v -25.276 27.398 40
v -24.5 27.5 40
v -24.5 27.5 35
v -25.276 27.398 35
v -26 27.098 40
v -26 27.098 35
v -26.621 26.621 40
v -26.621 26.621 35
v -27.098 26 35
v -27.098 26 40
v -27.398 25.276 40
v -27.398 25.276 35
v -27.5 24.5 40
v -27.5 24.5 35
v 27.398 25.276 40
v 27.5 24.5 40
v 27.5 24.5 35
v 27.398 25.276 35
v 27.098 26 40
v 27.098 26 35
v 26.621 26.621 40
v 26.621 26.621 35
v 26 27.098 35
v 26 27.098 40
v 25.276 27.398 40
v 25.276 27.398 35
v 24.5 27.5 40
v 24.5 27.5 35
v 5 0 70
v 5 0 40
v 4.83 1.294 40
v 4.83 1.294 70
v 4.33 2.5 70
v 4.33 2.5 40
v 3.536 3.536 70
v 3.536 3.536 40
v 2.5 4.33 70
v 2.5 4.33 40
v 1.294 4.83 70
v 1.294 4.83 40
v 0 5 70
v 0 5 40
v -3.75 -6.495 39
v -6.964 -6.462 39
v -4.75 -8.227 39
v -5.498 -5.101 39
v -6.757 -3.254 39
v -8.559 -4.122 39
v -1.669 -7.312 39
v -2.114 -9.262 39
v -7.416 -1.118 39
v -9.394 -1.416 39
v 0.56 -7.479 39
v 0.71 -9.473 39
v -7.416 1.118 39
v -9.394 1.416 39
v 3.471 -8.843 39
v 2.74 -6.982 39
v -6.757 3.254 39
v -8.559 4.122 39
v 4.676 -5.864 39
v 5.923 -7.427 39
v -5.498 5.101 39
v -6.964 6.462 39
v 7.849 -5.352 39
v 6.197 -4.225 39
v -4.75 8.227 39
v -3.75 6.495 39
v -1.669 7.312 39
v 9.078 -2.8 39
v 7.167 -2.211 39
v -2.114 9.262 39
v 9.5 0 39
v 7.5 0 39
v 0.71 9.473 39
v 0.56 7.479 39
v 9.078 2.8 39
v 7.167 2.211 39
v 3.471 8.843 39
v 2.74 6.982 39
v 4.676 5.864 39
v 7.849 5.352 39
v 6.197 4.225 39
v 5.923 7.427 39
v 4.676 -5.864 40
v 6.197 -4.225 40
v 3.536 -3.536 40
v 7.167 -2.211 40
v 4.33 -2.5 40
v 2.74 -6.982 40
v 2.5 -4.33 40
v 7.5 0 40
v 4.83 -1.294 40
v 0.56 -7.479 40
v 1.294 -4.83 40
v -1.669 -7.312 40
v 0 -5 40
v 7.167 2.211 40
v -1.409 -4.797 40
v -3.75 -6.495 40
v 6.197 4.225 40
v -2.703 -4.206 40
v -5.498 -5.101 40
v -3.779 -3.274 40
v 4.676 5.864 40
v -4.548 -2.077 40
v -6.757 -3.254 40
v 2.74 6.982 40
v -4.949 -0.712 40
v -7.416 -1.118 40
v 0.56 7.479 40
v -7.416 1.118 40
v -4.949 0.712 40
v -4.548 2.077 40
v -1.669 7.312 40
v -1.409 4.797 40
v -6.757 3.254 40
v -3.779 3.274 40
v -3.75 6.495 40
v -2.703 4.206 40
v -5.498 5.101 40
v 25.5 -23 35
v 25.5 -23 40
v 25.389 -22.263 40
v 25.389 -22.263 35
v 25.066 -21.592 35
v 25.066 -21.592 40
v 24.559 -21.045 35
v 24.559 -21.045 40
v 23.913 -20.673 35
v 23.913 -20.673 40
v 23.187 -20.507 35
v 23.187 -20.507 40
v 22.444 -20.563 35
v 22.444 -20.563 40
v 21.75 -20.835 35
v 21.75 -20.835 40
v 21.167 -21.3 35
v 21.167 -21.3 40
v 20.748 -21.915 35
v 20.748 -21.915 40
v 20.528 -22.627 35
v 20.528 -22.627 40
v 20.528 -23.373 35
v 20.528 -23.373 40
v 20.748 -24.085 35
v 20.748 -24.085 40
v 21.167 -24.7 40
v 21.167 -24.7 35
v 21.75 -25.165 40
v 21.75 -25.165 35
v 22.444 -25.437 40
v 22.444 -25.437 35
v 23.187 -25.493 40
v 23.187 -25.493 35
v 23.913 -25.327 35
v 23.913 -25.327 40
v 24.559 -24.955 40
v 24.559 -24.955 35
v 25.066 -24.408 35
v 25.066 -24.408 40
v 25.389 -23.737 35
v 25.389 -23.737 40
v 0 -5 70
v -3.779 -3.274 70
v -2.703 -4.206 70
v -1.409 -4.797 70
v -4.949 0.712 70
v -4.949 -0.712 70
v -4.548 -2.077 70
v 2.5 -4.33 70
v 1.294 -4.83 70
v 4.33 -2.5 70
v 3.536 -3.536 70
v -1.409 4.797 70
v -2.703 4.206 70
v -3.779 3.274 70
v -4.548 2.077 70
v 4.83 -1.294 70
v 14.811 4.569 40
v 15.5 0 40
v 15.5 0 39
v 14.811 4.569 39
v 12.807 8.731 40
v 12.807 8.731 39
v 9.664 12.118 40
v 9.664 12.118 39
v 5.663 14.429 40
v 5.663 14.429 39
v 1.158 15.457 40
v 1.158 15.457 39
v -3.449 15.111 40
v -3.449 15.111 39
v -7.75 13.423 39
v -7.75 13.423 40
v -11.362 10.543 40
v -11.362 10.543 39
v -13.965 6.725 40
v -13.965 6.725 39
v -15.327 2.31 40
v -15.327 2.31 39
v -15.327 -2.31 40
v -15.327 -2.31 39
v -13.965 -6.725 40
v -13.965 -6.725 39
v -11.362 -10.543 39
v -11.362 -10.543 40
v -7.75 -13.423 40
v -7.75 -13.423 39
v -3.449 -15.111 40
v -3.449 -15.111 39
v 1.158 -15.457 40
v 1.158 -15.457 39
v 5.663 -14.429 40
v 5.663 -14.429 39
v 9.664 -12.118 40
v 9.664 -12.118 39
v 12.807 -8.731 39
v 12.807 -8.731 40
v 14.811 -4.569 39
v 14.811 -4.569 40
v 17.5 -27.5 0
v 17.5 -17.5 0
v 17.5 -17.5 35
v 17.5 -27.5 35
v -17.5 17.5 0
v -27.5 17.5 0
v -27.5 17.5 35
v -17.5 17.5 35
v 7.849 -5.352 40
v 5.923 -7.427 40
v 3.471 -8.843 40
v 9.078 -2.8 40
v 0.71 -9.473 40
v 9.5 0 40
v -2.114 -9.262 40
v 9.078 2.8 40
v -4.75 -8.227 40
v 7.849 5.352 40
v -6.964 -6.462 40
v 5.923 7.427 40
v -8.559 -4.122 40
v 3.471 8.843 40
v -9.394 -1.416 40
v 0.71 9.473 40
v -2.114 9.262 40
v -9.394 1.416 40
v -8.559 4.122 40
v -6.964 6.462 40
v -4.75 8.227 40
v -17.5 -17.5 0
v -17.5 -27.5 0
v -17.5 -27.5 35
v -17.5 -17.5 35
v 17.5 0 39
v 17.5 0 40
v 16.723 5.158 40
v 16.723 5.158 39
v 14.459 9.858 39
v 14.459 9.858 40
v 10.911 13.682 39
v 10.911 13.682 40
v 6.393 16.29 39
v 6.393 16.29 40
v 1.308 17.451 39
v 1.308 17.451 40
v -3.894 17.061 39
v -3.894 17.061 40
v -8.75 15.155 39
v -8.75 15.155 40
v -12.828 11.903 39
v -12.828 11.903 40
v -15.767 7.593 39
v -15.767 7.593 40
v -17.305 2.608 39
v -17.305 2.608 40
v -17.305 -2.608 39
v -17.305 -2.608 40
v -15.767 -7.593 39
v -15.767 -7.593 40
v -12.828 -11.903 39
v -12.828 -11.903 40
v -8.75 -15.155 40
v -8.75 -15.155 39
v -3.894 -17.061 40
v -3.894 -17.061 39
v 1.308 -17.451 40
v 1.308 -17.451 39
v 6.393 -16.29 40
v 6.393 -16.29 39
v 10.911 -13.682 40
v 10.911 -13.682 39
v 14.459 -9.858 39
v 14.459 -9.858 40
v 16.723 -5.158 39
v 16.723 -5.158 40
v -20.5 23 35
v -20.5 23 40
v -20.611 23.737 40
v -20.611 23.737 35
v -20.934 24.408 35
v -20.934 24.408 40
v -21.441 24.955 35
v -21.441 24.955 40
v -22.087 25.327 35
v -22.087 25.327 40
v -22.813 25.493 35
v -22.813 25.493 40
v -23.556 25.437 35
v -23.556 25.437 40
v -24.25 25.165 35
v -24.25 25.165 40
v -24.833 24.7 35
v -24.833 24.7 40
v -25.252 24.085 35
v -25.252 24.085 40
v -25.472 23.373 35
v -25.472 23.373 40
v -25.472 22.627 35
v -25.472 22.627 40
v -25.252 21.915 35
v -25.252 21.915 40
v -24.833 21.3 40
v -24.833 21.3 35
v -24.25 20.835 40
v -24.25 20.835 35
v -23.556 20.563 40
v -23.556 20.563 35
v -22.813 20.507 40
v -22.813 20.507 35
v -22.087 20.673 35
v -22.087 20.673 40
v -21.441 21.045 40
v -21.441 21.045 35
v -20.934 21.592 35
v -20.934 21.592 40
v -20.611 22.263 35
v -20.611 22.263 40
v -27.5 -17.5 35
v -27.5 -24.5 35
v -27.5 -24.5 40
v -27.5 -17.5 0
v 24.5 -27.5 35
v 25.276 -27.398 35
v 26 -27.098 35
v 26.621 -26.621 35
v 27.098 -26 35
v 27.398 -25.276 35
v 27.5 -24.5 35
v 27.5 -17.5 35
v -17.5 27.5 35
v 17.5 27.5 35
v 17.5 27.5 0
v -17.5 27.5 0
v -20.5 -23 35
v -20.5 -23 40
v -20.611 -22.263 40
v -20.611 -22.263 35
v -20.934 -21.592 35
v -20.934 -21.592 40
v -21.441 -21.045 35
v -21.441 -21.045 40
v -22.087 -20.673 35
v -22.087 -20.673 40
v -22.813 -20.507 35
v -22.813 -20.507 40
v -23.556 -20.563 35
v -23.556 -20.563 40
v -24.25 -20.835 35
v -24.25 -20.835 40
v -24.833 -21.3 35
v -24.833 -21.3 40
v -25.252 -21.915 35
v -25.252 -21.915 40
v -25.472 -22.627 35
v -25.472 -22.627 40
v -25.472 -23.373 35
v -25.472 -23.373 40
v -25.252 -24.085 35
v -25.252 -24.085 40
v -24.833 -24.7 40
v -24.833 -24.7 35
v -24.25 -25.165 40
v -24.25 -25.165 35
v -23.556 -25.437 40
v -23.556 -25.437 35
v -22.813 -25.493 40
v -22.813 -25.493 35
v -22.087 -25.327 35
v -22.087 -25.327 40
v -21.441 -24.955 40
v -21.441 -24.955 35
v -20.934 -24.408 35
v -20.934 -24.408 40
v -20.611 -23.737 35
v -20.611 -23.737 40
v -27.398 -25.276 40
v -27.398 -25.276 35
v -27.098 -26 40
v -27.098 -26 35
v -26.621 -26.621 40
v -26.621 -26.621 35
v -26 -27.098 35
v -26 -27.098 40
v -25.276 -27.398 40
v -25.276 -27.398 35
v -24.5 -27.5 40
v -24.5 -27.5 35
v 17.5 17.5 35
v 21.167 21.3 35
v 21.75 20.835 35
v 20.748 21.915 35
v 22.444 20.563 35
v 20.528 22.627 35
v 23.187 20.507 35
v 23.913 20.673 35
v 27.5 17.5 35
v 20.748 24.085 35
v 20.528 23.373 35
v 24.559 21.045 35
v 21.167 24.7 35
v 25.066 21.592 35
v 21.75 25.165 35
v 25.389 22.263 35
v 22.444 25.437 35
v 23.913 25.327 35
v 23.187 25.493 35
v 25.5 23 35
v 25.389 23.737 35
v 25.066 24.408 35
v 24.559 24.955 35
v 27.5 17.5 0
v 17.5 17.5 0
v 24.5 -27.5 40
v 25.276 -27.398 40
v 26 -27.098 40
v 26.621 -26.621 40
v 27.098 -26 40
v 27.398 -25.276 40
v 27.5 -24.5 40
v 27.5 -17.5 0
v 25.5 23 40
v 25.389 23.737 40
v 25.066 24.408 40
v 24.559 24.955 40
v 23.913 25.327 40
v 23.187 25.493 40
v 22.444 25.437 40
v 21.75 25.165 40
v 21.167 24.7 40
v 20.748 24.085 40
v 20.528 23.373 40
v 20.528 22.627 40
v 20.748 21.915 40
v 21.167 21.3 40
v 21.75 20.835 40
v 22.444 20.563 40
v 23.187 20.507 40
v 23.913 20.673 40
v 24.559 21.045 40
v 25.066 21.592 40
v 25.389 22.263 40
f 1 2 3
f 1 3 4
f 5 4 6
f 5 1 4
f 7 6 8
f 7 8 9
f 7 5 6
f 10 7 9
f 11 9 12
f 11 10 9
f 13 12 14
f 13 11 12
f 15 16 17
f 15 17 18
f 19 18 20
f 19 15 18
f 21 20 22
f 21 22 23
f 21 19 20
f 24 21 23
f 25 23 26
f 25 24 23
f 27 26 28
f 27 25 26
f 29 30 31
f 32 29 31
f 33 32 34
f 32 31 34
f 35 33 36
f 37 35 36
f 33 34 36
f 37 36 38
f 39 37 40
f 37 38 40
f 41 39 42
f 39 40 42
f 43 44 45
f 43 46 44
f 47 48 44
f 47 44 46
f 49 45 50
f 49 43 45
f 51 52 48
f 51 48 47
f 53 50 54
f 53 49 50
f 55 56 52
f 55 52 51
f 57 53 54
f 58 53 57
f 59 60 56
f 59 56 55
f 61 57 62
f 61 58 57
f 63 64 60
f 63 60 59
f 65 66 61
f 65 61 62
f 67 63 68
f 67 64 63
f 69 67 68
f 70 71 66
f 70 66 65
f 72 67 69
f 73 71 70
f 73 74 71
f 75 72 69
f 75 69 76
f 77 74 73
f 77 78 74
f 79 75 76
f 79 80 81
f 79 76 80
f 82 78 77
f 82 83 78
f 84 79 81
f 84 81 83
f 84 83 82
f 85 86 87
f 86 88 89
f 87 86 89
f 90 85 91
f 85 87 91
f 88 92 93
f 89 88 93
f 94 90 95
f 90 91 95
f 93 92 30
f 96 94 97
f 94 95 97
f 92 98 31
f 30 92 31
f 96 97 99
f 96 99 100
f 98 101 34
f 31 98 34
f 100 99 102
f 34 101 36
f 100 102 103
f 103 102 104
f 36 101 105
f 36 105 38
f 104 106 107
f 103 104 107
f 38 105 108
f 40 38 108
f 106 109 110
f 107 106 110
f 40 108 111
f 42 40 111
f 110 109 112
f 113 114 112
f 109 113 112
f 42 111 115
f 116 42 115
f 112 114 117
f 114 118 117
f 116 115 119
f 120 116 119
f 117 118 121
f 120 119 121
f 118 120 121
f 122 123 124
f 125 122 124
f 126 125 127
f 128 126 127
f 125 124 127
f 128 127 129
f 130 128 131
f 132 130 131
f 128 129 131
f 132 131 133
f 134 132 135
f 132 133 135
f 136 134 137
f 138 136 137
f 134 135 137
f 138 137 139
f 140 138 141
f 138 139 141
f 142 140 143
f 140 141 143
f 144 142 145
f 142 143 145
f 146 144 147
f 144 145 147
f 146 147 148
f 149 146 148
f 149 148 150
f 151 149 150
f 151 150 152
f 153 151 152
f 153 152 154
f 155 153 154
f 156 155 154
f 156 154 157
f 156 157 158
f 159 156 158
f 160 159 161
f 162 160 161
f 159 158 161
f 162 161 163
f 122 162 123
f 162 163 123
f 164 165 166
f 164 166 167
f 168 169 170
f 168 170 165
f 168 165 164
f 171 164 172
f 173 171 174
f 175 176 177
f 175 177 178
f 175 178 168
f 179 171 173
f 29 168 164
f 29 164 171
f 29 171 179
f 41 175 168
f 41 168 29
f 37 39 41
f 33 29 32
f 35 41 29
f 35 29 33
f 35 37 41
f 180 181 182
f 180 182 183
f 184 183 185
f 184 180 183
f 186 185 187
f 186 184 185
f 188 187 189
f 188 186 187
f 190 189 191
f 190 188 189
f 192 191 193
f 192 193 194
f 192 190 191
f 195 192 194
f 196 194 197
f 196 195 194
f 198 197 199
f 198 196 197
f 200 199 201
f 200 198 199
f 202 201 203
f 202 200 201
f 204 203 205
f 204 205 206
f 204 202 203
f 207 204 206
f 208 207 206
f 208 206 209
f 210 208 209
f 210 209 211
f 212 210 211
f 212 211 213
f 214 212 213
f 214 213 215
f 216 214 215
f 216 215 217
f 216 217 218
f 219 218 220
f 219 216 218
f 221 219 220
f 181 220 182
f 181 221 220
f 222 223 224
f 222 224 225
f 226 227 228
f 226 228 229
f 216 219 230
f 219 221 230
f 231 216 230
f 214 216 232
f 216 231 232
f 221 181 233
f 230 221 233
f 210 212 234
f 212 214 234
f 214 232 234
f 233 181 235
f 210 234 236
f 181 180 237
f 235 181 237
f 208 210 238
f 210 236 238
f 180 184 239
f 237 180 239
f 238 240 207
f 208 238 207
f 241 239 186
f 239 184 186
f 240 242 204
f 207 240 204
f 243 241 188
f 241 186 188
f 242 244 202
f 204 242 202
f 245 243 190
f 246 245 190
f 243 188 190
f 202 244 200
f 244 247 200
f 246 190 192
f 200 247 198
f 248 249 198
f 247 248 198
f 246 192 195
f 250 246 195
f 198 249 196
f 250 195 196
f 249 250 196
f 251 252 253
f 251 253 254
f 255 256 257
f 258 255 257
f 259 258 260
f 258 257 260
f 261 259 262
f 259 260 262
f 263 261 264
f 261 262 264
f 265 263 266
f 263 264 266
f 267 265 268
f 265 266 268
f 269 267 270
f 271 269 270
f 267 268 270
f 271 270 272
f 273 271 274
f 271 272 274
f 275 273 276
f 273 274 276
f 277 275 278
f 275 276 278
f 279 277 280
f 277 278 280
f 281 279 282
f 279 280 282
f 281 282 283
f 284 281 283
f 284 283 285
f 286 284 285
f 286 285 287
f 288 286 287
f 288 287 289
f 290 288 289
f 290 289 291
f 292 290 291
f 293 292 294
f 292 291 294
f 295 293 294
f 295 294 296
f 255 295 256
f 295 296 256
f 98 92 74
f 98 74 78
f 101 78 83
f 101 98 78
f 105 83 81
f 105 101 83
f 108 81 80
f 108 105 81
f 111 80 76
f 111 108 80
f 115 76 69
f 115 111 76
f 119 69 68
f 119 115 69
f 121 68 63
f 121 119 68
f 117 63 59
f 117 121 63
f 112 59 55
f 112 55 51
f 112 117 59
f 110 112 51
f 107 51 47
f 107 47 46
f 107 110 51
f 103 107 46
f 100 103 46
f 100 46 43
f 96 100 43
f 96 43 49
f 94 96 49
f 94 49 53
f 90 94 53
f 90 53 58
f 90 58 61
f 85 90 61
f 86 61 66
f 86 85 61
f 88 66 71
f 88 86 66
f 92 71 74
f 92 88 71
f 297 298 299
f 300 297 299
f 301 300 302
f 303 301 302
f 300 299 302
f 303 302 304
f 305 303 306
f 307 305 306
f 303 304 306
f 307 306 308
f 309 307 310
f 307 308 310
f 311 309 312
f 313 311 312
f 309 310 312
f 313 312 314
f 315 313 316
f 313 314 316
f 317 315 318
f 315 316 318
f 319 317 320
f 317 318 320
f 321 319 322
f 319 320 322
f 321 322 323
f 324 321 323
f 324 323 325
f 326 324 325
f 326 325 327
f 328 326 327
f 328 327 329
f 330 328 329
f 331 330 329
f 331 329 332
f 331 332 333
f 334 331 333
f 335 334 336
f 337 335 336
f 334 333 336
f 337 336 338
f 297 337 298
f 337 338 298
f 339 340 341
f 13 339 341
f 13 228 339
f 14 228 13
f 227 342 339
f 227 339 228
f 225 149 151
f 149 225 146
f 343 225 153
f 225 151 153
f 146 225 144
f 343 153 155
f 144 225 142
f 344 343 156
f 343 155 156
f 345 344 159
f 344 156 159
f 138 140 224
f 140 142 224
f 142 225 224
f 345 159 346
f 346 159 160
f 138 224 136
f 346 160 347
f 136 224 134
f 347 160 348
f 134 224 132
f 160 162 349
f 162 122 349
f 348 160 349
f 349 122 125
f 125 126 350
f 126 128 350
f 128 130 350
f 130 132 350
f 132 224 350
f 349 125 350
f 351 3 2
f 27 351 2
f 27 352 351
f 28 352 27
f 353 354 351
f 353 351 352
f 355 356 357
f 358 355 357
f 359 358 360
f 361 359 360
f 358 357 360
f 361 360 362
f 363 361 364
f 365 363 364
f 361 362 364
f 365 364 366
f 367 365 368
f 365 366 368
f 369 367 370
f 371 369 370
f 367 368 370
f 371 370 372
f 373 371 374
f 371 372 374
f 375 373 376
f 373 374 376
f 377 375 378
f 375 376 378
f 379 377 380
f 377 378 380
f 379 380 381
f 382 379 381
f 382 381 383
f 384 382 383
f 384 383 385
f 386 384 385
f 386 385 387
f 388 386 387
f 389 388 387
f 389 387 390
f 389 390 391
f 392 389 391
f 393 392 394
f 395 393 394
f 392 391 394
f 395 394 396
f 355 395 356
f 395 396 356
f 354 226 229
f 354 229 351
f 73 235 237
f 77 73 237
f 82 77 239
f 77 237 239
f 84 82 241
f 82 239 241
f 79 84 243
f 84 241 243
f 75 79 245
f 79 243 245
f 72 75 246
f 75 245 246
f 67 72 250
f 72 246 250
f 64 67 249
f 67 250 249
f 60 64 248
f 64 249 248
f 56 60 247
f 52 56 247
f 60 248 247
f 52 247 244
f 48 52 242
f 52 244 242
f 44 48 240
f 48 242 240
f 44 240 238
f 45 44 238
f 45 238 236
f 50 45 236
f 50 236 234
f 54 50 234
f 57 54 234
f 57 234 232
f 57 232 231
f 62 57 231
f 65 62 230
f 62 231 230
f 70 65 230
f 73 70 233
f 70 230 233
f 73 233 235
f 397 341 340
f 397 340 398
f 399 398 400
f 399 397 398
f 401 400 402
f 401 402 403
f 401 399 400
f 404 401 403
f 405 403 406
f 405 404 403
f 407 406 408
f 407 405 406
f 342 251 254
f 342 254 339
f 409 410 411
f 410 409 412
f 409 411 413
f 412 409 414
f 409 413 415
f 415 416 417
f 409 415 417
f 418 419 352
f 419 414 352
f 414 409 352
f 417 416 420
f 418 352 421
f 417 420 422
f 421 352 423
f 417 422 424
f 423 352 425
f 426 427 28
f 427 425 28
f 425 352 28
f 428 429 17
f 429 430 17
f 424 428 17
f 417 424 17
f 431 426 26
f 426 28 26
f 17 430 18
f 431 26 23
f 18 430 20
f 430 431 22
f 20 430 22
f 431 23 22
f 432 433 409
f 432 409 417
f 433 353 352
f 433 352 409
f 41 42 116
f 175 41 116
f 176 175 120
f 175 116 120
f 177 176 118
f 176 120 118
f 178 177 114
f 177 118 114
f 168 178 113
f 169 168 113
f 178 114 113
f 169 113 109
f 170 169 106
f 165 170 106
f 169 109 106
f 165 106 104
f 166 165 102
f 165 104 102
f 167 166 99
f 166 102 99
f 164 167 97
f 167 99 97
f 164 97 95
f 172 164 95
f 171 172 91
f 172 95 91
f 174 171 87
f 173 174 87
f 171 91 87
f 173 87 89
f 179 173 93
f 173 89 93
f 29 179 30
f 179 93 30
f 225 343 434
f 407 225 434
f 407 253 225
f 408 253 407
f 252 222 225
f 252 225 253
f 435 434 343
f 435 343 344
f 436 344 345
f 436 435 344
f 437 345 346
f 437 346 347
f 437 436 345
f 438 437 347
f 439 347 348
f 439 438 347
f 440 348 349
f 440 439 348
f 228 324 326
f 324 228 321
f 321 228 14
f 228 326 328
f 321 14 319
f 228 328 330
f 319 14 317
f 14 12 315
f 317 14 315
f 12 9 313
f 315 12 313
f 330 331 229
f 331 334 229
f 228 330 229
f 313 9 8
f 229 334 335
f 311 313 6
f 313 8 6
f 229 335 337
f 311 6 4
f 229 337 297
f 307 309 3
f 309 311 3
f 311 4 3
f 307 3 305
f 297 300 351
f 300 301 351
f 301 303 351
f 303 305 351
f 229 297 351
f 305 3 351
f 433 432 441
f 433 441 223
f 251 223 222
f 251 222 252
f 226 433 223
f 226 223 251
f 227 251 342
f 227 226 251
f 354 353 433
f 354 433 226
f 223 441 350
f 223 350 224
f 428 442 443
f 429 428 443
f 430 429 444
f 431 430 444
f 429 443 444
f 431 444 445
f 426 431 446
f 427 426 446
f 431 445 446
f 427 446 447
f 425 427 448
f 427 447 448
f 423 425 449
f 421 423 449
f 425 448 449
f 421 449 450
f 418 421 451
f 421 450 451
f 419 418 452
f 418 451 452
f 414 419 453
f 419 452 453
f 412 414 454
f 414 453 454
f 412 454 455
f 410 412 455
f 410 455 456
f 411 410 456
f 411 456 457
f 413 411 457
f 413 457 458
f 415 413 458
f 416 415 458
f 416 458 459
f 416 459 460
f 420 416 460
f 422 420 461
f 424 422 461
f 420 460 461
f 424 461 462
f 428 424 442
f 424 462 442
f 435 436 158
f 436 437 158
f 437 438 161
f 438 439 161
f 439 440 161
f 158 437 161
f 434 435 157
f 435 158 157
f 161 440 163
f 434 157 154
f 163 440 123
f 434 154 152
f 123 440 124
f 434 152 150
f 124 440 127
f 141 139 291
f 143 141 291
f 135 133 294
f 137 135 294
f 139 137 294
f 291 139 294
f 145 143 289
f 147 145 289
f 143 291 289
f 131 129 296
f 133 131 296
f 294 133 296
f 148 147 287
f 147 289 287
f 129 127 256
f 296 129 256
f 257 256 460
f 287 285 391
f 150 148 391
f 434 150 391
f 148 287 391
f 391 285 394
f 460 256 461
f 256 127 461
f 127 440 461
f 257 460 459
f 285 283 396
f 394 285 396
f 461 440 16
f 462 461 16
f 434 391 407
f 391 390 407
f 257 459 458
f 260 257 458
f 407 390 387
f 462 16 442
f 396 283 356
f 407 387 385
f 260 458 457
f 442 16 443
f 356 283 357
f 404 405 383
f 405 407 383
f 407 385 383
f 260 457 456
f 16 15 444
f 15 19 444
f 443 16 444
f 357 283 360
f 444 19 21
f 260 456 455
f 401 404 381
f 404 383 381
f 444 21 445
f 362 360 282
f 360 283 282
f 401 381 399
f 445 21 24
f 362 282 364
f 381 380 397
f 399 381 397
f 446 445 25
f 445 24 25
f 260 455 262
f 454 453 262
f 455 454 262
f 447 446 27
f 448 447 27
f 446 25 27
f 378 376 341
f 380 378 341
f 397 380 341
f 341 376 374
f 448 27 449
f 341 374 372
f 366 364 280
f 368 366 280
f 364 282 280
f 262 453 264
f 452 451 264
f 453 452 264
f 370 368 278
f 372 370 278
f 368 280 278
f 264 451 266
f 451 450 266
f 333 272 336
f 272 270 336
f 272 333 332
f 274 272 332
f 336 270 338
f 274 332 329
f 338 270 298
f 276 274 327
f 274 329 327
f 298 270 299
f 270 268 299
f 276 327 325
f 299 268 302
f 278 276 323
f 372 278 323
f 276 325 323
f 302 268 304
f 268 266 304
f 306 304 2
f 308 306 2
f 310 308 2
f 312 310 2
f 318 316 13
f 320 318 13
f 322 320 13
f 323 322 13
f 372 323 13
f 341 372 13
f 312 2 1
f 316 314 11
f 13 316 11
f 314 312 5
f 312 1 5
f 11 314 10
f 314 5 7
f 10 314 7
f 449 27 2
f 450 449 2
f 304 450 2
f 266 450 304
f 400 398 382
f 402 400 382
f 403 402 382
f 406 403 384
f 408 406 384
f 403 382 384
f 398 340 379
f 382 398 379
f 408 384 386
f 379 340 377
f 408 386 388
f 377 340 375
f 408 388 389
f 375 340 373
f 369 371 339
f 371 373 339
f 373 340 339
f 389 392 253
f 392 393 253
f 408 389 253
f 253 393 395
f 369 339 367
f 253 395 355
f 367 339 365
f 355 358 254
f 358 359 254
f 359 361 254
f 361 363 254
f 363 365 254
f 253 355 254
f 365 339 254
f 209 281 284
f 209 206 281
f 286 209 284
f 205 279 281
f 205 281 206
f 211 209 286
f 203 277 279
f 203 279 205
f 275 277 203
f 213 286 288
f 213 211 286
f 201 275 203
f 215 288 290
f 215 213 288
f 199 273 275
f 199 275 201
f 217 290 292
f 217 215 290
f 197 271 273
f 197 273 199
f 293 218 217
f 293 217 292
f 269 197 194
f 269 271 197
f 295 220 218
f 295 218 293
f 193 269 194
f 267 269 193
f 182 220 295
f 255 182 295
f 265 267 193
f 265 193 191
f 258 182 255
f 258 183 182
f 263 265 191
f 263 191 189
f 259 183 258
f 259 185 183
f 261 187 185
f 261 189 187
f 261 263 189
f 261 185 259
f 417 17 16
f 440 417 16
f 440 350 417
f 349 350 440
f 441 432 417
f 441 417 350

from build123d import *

# Parameters (mm, degrees)
BOSS_EXTRUDE1_DEPTH = 40
SKETCH3_R           = 2.5
BOSS_EXTRUDE2_DEPTH = 5
BOSS_EXTRUDE3_DEPTH = 30
SKETCH5_R           = 17.5
SKETCH5_R_2         = 15.5
SKETCH5_R_3         = 9.5
SKETCH5_R_4         = 7.5
CUT_EXTRUDE1_DEPTH  = 1


with BuildPart() as part:
    # Sketch1 → Boss-Extrude1 (new body)
    with BuildSketch(Plane.XY):
        Polygon((-27.5, -17.5), (-27.5, 17.5), (-17.5, 17.5), (-17.5, 27.5), (17.5, 27.5), (17.5, 17.5), (27.5, 17.5), (27.5, -17.5), (17.5, -17.5), (17.5, -27.5), (-17.5, -27.5), (-17.5, -17.5), align=None)
    extrude(amount=BOSS_EXTRUDE1_DEPTH)

    # Sketch3 → Boss-Extrude2 (add)
    # profile 1 of 5: a face of its own
    with BuildSketch(Plane.XY.offset(40)):
        Polygon((17.5, 27.5), (-17.5, 27.5), (-17.5, 17.5), (-27.5, 17.5), (-27.5, -17.5), (-17.5, -17.5), (-17.5, -27.5), (17.5, -27.5), (17.5, -17.5), (27.5, -17.5), (27.5, 17.5), (17.5, 17.5), align=None)
    # profile 2 of 5: a face of its own
    with BuildSketch(Plane.XY.offset(40)):
        with BuildLine():
            Line((24.5, 27.5), (17.5, 27.5))
            Line((17.5, 27.5), (17.5, 17.5))
            Line((17.5, 17.5), (27.5, 17.5))
            Line((27.5, 17.5), (27.5, 24.5))
            ThreePointArc((27.5, 24.5), (26.621320344, 26.621320344), (24.5, 27.5))
        make_face()
        with Locations((23, 23)):
            Circle(SKETCH3_R, mode=Mode.SUBTRACT)
    # profile 3 of 5: a face of its own
    with BuildSketch(Plane.XY.offset(40)):
        with BuildLine():
            Line((27.5, -24.5), (27.5, -17.5))
            Line((27.5, -17.5), (17.5, -17.5))
            Line((17.5, -17.5), (17.5, -27.5))
            Line((17.5, -27.5), (24.5, -27.5))
            ThreePointArc((24.5, -27.5), (26.621320344, -26.621320344), (27.5, -24.5))
        make_face()
        with Locations((23, -23)):
            Circle(SKETCH3_R, mode=Mode.SUBTRACT)
    # profile 4 of 5: a face of its own
    with BuildSketch(Plane.XY.offset(40)):
        with BuildLine():
            Line((-17.5, -17.5), (-27.5, -17.5))
            Line((-27.5, -17.5), (-27.5, -24.5))
            ThreePointArc((-27.5, -24.5), (-26.621320344, -26.621320344), (-24.5, -27.5))
            Line((-24.5, -27.5), (-17.5, -27.5))
            Line((-17.5, -27.5), (-17.5, -17.5))
        make_face()
        with Locations((-23, -23)):
            Circle(SKETCH3_R, mode=Mode.SUBTRACT)
    # profile 5 of 5: a face of its own
    with BuildSketch(Plane.XY.offset(40)):
        with BuildLine():
            Line((-17.5, 17.5), (-17.5, 27.5))
            Line((-17.5, 27.5), (-24.5, 27.5))
            ThreePointArc((-24.5, 27.5), (-26.621320344, 26.621320344), (-27.5, 24.5))
            Line((-27.5, 24.5), (-27.5, 17.5))
            Line((-27.5, 17.5), (-17.5, 17.5))
        make_face()
        with Locations((-23, 23)):
            Circle(SKETCH3_R, mode=Mode.SUBTRACT)
    extrude(amount=-BOSS_EXTRUDE2_DEPTH)

    # Sketch4 → Boss-Extrude3 (add)
    with BuildSketch(Plane.XY.offset(40)):
        with BuildLine():
            ThreePointArc((5, 0), (3.535533906, 3.535533906), (0, 5))
            Line((0, 5), (0, -5))
            ThreePointArc((0, -5), (3.535533906, -3.535533906), (5, 0))
        make_face()
        with BuildLine():
            Line((0, -5), (0, 5))
            ThreePointArc((0, 5), (-5, 0), (0, -5))
        make_face()
    extrude(amount=BOSS_EXTRUDE3_DEPTH)

    # Sketch5 → Cut-Extrude1 (cut)
    # profile 1 of 2: a face of its own
    with BuildSketch(Plane.XY.offset(40)):
        Circle(SKETCH5_R)
        Circle(SKETCH5_R_2, mode=Mode.SUBTRACT)
    # profile 2 of 2: a face of its own
    with BuildSketch(Plane.XY.offset(40)):
        Circle(SKETCH5_R_3)
        Circle(SKETCH5_R_4, mode=Mode.SUBTRACT)
    extrude(amount=-CUT_EXTRUDE1_DEPTH, mode=Mode.SUBTRACT)


solid = part.part
